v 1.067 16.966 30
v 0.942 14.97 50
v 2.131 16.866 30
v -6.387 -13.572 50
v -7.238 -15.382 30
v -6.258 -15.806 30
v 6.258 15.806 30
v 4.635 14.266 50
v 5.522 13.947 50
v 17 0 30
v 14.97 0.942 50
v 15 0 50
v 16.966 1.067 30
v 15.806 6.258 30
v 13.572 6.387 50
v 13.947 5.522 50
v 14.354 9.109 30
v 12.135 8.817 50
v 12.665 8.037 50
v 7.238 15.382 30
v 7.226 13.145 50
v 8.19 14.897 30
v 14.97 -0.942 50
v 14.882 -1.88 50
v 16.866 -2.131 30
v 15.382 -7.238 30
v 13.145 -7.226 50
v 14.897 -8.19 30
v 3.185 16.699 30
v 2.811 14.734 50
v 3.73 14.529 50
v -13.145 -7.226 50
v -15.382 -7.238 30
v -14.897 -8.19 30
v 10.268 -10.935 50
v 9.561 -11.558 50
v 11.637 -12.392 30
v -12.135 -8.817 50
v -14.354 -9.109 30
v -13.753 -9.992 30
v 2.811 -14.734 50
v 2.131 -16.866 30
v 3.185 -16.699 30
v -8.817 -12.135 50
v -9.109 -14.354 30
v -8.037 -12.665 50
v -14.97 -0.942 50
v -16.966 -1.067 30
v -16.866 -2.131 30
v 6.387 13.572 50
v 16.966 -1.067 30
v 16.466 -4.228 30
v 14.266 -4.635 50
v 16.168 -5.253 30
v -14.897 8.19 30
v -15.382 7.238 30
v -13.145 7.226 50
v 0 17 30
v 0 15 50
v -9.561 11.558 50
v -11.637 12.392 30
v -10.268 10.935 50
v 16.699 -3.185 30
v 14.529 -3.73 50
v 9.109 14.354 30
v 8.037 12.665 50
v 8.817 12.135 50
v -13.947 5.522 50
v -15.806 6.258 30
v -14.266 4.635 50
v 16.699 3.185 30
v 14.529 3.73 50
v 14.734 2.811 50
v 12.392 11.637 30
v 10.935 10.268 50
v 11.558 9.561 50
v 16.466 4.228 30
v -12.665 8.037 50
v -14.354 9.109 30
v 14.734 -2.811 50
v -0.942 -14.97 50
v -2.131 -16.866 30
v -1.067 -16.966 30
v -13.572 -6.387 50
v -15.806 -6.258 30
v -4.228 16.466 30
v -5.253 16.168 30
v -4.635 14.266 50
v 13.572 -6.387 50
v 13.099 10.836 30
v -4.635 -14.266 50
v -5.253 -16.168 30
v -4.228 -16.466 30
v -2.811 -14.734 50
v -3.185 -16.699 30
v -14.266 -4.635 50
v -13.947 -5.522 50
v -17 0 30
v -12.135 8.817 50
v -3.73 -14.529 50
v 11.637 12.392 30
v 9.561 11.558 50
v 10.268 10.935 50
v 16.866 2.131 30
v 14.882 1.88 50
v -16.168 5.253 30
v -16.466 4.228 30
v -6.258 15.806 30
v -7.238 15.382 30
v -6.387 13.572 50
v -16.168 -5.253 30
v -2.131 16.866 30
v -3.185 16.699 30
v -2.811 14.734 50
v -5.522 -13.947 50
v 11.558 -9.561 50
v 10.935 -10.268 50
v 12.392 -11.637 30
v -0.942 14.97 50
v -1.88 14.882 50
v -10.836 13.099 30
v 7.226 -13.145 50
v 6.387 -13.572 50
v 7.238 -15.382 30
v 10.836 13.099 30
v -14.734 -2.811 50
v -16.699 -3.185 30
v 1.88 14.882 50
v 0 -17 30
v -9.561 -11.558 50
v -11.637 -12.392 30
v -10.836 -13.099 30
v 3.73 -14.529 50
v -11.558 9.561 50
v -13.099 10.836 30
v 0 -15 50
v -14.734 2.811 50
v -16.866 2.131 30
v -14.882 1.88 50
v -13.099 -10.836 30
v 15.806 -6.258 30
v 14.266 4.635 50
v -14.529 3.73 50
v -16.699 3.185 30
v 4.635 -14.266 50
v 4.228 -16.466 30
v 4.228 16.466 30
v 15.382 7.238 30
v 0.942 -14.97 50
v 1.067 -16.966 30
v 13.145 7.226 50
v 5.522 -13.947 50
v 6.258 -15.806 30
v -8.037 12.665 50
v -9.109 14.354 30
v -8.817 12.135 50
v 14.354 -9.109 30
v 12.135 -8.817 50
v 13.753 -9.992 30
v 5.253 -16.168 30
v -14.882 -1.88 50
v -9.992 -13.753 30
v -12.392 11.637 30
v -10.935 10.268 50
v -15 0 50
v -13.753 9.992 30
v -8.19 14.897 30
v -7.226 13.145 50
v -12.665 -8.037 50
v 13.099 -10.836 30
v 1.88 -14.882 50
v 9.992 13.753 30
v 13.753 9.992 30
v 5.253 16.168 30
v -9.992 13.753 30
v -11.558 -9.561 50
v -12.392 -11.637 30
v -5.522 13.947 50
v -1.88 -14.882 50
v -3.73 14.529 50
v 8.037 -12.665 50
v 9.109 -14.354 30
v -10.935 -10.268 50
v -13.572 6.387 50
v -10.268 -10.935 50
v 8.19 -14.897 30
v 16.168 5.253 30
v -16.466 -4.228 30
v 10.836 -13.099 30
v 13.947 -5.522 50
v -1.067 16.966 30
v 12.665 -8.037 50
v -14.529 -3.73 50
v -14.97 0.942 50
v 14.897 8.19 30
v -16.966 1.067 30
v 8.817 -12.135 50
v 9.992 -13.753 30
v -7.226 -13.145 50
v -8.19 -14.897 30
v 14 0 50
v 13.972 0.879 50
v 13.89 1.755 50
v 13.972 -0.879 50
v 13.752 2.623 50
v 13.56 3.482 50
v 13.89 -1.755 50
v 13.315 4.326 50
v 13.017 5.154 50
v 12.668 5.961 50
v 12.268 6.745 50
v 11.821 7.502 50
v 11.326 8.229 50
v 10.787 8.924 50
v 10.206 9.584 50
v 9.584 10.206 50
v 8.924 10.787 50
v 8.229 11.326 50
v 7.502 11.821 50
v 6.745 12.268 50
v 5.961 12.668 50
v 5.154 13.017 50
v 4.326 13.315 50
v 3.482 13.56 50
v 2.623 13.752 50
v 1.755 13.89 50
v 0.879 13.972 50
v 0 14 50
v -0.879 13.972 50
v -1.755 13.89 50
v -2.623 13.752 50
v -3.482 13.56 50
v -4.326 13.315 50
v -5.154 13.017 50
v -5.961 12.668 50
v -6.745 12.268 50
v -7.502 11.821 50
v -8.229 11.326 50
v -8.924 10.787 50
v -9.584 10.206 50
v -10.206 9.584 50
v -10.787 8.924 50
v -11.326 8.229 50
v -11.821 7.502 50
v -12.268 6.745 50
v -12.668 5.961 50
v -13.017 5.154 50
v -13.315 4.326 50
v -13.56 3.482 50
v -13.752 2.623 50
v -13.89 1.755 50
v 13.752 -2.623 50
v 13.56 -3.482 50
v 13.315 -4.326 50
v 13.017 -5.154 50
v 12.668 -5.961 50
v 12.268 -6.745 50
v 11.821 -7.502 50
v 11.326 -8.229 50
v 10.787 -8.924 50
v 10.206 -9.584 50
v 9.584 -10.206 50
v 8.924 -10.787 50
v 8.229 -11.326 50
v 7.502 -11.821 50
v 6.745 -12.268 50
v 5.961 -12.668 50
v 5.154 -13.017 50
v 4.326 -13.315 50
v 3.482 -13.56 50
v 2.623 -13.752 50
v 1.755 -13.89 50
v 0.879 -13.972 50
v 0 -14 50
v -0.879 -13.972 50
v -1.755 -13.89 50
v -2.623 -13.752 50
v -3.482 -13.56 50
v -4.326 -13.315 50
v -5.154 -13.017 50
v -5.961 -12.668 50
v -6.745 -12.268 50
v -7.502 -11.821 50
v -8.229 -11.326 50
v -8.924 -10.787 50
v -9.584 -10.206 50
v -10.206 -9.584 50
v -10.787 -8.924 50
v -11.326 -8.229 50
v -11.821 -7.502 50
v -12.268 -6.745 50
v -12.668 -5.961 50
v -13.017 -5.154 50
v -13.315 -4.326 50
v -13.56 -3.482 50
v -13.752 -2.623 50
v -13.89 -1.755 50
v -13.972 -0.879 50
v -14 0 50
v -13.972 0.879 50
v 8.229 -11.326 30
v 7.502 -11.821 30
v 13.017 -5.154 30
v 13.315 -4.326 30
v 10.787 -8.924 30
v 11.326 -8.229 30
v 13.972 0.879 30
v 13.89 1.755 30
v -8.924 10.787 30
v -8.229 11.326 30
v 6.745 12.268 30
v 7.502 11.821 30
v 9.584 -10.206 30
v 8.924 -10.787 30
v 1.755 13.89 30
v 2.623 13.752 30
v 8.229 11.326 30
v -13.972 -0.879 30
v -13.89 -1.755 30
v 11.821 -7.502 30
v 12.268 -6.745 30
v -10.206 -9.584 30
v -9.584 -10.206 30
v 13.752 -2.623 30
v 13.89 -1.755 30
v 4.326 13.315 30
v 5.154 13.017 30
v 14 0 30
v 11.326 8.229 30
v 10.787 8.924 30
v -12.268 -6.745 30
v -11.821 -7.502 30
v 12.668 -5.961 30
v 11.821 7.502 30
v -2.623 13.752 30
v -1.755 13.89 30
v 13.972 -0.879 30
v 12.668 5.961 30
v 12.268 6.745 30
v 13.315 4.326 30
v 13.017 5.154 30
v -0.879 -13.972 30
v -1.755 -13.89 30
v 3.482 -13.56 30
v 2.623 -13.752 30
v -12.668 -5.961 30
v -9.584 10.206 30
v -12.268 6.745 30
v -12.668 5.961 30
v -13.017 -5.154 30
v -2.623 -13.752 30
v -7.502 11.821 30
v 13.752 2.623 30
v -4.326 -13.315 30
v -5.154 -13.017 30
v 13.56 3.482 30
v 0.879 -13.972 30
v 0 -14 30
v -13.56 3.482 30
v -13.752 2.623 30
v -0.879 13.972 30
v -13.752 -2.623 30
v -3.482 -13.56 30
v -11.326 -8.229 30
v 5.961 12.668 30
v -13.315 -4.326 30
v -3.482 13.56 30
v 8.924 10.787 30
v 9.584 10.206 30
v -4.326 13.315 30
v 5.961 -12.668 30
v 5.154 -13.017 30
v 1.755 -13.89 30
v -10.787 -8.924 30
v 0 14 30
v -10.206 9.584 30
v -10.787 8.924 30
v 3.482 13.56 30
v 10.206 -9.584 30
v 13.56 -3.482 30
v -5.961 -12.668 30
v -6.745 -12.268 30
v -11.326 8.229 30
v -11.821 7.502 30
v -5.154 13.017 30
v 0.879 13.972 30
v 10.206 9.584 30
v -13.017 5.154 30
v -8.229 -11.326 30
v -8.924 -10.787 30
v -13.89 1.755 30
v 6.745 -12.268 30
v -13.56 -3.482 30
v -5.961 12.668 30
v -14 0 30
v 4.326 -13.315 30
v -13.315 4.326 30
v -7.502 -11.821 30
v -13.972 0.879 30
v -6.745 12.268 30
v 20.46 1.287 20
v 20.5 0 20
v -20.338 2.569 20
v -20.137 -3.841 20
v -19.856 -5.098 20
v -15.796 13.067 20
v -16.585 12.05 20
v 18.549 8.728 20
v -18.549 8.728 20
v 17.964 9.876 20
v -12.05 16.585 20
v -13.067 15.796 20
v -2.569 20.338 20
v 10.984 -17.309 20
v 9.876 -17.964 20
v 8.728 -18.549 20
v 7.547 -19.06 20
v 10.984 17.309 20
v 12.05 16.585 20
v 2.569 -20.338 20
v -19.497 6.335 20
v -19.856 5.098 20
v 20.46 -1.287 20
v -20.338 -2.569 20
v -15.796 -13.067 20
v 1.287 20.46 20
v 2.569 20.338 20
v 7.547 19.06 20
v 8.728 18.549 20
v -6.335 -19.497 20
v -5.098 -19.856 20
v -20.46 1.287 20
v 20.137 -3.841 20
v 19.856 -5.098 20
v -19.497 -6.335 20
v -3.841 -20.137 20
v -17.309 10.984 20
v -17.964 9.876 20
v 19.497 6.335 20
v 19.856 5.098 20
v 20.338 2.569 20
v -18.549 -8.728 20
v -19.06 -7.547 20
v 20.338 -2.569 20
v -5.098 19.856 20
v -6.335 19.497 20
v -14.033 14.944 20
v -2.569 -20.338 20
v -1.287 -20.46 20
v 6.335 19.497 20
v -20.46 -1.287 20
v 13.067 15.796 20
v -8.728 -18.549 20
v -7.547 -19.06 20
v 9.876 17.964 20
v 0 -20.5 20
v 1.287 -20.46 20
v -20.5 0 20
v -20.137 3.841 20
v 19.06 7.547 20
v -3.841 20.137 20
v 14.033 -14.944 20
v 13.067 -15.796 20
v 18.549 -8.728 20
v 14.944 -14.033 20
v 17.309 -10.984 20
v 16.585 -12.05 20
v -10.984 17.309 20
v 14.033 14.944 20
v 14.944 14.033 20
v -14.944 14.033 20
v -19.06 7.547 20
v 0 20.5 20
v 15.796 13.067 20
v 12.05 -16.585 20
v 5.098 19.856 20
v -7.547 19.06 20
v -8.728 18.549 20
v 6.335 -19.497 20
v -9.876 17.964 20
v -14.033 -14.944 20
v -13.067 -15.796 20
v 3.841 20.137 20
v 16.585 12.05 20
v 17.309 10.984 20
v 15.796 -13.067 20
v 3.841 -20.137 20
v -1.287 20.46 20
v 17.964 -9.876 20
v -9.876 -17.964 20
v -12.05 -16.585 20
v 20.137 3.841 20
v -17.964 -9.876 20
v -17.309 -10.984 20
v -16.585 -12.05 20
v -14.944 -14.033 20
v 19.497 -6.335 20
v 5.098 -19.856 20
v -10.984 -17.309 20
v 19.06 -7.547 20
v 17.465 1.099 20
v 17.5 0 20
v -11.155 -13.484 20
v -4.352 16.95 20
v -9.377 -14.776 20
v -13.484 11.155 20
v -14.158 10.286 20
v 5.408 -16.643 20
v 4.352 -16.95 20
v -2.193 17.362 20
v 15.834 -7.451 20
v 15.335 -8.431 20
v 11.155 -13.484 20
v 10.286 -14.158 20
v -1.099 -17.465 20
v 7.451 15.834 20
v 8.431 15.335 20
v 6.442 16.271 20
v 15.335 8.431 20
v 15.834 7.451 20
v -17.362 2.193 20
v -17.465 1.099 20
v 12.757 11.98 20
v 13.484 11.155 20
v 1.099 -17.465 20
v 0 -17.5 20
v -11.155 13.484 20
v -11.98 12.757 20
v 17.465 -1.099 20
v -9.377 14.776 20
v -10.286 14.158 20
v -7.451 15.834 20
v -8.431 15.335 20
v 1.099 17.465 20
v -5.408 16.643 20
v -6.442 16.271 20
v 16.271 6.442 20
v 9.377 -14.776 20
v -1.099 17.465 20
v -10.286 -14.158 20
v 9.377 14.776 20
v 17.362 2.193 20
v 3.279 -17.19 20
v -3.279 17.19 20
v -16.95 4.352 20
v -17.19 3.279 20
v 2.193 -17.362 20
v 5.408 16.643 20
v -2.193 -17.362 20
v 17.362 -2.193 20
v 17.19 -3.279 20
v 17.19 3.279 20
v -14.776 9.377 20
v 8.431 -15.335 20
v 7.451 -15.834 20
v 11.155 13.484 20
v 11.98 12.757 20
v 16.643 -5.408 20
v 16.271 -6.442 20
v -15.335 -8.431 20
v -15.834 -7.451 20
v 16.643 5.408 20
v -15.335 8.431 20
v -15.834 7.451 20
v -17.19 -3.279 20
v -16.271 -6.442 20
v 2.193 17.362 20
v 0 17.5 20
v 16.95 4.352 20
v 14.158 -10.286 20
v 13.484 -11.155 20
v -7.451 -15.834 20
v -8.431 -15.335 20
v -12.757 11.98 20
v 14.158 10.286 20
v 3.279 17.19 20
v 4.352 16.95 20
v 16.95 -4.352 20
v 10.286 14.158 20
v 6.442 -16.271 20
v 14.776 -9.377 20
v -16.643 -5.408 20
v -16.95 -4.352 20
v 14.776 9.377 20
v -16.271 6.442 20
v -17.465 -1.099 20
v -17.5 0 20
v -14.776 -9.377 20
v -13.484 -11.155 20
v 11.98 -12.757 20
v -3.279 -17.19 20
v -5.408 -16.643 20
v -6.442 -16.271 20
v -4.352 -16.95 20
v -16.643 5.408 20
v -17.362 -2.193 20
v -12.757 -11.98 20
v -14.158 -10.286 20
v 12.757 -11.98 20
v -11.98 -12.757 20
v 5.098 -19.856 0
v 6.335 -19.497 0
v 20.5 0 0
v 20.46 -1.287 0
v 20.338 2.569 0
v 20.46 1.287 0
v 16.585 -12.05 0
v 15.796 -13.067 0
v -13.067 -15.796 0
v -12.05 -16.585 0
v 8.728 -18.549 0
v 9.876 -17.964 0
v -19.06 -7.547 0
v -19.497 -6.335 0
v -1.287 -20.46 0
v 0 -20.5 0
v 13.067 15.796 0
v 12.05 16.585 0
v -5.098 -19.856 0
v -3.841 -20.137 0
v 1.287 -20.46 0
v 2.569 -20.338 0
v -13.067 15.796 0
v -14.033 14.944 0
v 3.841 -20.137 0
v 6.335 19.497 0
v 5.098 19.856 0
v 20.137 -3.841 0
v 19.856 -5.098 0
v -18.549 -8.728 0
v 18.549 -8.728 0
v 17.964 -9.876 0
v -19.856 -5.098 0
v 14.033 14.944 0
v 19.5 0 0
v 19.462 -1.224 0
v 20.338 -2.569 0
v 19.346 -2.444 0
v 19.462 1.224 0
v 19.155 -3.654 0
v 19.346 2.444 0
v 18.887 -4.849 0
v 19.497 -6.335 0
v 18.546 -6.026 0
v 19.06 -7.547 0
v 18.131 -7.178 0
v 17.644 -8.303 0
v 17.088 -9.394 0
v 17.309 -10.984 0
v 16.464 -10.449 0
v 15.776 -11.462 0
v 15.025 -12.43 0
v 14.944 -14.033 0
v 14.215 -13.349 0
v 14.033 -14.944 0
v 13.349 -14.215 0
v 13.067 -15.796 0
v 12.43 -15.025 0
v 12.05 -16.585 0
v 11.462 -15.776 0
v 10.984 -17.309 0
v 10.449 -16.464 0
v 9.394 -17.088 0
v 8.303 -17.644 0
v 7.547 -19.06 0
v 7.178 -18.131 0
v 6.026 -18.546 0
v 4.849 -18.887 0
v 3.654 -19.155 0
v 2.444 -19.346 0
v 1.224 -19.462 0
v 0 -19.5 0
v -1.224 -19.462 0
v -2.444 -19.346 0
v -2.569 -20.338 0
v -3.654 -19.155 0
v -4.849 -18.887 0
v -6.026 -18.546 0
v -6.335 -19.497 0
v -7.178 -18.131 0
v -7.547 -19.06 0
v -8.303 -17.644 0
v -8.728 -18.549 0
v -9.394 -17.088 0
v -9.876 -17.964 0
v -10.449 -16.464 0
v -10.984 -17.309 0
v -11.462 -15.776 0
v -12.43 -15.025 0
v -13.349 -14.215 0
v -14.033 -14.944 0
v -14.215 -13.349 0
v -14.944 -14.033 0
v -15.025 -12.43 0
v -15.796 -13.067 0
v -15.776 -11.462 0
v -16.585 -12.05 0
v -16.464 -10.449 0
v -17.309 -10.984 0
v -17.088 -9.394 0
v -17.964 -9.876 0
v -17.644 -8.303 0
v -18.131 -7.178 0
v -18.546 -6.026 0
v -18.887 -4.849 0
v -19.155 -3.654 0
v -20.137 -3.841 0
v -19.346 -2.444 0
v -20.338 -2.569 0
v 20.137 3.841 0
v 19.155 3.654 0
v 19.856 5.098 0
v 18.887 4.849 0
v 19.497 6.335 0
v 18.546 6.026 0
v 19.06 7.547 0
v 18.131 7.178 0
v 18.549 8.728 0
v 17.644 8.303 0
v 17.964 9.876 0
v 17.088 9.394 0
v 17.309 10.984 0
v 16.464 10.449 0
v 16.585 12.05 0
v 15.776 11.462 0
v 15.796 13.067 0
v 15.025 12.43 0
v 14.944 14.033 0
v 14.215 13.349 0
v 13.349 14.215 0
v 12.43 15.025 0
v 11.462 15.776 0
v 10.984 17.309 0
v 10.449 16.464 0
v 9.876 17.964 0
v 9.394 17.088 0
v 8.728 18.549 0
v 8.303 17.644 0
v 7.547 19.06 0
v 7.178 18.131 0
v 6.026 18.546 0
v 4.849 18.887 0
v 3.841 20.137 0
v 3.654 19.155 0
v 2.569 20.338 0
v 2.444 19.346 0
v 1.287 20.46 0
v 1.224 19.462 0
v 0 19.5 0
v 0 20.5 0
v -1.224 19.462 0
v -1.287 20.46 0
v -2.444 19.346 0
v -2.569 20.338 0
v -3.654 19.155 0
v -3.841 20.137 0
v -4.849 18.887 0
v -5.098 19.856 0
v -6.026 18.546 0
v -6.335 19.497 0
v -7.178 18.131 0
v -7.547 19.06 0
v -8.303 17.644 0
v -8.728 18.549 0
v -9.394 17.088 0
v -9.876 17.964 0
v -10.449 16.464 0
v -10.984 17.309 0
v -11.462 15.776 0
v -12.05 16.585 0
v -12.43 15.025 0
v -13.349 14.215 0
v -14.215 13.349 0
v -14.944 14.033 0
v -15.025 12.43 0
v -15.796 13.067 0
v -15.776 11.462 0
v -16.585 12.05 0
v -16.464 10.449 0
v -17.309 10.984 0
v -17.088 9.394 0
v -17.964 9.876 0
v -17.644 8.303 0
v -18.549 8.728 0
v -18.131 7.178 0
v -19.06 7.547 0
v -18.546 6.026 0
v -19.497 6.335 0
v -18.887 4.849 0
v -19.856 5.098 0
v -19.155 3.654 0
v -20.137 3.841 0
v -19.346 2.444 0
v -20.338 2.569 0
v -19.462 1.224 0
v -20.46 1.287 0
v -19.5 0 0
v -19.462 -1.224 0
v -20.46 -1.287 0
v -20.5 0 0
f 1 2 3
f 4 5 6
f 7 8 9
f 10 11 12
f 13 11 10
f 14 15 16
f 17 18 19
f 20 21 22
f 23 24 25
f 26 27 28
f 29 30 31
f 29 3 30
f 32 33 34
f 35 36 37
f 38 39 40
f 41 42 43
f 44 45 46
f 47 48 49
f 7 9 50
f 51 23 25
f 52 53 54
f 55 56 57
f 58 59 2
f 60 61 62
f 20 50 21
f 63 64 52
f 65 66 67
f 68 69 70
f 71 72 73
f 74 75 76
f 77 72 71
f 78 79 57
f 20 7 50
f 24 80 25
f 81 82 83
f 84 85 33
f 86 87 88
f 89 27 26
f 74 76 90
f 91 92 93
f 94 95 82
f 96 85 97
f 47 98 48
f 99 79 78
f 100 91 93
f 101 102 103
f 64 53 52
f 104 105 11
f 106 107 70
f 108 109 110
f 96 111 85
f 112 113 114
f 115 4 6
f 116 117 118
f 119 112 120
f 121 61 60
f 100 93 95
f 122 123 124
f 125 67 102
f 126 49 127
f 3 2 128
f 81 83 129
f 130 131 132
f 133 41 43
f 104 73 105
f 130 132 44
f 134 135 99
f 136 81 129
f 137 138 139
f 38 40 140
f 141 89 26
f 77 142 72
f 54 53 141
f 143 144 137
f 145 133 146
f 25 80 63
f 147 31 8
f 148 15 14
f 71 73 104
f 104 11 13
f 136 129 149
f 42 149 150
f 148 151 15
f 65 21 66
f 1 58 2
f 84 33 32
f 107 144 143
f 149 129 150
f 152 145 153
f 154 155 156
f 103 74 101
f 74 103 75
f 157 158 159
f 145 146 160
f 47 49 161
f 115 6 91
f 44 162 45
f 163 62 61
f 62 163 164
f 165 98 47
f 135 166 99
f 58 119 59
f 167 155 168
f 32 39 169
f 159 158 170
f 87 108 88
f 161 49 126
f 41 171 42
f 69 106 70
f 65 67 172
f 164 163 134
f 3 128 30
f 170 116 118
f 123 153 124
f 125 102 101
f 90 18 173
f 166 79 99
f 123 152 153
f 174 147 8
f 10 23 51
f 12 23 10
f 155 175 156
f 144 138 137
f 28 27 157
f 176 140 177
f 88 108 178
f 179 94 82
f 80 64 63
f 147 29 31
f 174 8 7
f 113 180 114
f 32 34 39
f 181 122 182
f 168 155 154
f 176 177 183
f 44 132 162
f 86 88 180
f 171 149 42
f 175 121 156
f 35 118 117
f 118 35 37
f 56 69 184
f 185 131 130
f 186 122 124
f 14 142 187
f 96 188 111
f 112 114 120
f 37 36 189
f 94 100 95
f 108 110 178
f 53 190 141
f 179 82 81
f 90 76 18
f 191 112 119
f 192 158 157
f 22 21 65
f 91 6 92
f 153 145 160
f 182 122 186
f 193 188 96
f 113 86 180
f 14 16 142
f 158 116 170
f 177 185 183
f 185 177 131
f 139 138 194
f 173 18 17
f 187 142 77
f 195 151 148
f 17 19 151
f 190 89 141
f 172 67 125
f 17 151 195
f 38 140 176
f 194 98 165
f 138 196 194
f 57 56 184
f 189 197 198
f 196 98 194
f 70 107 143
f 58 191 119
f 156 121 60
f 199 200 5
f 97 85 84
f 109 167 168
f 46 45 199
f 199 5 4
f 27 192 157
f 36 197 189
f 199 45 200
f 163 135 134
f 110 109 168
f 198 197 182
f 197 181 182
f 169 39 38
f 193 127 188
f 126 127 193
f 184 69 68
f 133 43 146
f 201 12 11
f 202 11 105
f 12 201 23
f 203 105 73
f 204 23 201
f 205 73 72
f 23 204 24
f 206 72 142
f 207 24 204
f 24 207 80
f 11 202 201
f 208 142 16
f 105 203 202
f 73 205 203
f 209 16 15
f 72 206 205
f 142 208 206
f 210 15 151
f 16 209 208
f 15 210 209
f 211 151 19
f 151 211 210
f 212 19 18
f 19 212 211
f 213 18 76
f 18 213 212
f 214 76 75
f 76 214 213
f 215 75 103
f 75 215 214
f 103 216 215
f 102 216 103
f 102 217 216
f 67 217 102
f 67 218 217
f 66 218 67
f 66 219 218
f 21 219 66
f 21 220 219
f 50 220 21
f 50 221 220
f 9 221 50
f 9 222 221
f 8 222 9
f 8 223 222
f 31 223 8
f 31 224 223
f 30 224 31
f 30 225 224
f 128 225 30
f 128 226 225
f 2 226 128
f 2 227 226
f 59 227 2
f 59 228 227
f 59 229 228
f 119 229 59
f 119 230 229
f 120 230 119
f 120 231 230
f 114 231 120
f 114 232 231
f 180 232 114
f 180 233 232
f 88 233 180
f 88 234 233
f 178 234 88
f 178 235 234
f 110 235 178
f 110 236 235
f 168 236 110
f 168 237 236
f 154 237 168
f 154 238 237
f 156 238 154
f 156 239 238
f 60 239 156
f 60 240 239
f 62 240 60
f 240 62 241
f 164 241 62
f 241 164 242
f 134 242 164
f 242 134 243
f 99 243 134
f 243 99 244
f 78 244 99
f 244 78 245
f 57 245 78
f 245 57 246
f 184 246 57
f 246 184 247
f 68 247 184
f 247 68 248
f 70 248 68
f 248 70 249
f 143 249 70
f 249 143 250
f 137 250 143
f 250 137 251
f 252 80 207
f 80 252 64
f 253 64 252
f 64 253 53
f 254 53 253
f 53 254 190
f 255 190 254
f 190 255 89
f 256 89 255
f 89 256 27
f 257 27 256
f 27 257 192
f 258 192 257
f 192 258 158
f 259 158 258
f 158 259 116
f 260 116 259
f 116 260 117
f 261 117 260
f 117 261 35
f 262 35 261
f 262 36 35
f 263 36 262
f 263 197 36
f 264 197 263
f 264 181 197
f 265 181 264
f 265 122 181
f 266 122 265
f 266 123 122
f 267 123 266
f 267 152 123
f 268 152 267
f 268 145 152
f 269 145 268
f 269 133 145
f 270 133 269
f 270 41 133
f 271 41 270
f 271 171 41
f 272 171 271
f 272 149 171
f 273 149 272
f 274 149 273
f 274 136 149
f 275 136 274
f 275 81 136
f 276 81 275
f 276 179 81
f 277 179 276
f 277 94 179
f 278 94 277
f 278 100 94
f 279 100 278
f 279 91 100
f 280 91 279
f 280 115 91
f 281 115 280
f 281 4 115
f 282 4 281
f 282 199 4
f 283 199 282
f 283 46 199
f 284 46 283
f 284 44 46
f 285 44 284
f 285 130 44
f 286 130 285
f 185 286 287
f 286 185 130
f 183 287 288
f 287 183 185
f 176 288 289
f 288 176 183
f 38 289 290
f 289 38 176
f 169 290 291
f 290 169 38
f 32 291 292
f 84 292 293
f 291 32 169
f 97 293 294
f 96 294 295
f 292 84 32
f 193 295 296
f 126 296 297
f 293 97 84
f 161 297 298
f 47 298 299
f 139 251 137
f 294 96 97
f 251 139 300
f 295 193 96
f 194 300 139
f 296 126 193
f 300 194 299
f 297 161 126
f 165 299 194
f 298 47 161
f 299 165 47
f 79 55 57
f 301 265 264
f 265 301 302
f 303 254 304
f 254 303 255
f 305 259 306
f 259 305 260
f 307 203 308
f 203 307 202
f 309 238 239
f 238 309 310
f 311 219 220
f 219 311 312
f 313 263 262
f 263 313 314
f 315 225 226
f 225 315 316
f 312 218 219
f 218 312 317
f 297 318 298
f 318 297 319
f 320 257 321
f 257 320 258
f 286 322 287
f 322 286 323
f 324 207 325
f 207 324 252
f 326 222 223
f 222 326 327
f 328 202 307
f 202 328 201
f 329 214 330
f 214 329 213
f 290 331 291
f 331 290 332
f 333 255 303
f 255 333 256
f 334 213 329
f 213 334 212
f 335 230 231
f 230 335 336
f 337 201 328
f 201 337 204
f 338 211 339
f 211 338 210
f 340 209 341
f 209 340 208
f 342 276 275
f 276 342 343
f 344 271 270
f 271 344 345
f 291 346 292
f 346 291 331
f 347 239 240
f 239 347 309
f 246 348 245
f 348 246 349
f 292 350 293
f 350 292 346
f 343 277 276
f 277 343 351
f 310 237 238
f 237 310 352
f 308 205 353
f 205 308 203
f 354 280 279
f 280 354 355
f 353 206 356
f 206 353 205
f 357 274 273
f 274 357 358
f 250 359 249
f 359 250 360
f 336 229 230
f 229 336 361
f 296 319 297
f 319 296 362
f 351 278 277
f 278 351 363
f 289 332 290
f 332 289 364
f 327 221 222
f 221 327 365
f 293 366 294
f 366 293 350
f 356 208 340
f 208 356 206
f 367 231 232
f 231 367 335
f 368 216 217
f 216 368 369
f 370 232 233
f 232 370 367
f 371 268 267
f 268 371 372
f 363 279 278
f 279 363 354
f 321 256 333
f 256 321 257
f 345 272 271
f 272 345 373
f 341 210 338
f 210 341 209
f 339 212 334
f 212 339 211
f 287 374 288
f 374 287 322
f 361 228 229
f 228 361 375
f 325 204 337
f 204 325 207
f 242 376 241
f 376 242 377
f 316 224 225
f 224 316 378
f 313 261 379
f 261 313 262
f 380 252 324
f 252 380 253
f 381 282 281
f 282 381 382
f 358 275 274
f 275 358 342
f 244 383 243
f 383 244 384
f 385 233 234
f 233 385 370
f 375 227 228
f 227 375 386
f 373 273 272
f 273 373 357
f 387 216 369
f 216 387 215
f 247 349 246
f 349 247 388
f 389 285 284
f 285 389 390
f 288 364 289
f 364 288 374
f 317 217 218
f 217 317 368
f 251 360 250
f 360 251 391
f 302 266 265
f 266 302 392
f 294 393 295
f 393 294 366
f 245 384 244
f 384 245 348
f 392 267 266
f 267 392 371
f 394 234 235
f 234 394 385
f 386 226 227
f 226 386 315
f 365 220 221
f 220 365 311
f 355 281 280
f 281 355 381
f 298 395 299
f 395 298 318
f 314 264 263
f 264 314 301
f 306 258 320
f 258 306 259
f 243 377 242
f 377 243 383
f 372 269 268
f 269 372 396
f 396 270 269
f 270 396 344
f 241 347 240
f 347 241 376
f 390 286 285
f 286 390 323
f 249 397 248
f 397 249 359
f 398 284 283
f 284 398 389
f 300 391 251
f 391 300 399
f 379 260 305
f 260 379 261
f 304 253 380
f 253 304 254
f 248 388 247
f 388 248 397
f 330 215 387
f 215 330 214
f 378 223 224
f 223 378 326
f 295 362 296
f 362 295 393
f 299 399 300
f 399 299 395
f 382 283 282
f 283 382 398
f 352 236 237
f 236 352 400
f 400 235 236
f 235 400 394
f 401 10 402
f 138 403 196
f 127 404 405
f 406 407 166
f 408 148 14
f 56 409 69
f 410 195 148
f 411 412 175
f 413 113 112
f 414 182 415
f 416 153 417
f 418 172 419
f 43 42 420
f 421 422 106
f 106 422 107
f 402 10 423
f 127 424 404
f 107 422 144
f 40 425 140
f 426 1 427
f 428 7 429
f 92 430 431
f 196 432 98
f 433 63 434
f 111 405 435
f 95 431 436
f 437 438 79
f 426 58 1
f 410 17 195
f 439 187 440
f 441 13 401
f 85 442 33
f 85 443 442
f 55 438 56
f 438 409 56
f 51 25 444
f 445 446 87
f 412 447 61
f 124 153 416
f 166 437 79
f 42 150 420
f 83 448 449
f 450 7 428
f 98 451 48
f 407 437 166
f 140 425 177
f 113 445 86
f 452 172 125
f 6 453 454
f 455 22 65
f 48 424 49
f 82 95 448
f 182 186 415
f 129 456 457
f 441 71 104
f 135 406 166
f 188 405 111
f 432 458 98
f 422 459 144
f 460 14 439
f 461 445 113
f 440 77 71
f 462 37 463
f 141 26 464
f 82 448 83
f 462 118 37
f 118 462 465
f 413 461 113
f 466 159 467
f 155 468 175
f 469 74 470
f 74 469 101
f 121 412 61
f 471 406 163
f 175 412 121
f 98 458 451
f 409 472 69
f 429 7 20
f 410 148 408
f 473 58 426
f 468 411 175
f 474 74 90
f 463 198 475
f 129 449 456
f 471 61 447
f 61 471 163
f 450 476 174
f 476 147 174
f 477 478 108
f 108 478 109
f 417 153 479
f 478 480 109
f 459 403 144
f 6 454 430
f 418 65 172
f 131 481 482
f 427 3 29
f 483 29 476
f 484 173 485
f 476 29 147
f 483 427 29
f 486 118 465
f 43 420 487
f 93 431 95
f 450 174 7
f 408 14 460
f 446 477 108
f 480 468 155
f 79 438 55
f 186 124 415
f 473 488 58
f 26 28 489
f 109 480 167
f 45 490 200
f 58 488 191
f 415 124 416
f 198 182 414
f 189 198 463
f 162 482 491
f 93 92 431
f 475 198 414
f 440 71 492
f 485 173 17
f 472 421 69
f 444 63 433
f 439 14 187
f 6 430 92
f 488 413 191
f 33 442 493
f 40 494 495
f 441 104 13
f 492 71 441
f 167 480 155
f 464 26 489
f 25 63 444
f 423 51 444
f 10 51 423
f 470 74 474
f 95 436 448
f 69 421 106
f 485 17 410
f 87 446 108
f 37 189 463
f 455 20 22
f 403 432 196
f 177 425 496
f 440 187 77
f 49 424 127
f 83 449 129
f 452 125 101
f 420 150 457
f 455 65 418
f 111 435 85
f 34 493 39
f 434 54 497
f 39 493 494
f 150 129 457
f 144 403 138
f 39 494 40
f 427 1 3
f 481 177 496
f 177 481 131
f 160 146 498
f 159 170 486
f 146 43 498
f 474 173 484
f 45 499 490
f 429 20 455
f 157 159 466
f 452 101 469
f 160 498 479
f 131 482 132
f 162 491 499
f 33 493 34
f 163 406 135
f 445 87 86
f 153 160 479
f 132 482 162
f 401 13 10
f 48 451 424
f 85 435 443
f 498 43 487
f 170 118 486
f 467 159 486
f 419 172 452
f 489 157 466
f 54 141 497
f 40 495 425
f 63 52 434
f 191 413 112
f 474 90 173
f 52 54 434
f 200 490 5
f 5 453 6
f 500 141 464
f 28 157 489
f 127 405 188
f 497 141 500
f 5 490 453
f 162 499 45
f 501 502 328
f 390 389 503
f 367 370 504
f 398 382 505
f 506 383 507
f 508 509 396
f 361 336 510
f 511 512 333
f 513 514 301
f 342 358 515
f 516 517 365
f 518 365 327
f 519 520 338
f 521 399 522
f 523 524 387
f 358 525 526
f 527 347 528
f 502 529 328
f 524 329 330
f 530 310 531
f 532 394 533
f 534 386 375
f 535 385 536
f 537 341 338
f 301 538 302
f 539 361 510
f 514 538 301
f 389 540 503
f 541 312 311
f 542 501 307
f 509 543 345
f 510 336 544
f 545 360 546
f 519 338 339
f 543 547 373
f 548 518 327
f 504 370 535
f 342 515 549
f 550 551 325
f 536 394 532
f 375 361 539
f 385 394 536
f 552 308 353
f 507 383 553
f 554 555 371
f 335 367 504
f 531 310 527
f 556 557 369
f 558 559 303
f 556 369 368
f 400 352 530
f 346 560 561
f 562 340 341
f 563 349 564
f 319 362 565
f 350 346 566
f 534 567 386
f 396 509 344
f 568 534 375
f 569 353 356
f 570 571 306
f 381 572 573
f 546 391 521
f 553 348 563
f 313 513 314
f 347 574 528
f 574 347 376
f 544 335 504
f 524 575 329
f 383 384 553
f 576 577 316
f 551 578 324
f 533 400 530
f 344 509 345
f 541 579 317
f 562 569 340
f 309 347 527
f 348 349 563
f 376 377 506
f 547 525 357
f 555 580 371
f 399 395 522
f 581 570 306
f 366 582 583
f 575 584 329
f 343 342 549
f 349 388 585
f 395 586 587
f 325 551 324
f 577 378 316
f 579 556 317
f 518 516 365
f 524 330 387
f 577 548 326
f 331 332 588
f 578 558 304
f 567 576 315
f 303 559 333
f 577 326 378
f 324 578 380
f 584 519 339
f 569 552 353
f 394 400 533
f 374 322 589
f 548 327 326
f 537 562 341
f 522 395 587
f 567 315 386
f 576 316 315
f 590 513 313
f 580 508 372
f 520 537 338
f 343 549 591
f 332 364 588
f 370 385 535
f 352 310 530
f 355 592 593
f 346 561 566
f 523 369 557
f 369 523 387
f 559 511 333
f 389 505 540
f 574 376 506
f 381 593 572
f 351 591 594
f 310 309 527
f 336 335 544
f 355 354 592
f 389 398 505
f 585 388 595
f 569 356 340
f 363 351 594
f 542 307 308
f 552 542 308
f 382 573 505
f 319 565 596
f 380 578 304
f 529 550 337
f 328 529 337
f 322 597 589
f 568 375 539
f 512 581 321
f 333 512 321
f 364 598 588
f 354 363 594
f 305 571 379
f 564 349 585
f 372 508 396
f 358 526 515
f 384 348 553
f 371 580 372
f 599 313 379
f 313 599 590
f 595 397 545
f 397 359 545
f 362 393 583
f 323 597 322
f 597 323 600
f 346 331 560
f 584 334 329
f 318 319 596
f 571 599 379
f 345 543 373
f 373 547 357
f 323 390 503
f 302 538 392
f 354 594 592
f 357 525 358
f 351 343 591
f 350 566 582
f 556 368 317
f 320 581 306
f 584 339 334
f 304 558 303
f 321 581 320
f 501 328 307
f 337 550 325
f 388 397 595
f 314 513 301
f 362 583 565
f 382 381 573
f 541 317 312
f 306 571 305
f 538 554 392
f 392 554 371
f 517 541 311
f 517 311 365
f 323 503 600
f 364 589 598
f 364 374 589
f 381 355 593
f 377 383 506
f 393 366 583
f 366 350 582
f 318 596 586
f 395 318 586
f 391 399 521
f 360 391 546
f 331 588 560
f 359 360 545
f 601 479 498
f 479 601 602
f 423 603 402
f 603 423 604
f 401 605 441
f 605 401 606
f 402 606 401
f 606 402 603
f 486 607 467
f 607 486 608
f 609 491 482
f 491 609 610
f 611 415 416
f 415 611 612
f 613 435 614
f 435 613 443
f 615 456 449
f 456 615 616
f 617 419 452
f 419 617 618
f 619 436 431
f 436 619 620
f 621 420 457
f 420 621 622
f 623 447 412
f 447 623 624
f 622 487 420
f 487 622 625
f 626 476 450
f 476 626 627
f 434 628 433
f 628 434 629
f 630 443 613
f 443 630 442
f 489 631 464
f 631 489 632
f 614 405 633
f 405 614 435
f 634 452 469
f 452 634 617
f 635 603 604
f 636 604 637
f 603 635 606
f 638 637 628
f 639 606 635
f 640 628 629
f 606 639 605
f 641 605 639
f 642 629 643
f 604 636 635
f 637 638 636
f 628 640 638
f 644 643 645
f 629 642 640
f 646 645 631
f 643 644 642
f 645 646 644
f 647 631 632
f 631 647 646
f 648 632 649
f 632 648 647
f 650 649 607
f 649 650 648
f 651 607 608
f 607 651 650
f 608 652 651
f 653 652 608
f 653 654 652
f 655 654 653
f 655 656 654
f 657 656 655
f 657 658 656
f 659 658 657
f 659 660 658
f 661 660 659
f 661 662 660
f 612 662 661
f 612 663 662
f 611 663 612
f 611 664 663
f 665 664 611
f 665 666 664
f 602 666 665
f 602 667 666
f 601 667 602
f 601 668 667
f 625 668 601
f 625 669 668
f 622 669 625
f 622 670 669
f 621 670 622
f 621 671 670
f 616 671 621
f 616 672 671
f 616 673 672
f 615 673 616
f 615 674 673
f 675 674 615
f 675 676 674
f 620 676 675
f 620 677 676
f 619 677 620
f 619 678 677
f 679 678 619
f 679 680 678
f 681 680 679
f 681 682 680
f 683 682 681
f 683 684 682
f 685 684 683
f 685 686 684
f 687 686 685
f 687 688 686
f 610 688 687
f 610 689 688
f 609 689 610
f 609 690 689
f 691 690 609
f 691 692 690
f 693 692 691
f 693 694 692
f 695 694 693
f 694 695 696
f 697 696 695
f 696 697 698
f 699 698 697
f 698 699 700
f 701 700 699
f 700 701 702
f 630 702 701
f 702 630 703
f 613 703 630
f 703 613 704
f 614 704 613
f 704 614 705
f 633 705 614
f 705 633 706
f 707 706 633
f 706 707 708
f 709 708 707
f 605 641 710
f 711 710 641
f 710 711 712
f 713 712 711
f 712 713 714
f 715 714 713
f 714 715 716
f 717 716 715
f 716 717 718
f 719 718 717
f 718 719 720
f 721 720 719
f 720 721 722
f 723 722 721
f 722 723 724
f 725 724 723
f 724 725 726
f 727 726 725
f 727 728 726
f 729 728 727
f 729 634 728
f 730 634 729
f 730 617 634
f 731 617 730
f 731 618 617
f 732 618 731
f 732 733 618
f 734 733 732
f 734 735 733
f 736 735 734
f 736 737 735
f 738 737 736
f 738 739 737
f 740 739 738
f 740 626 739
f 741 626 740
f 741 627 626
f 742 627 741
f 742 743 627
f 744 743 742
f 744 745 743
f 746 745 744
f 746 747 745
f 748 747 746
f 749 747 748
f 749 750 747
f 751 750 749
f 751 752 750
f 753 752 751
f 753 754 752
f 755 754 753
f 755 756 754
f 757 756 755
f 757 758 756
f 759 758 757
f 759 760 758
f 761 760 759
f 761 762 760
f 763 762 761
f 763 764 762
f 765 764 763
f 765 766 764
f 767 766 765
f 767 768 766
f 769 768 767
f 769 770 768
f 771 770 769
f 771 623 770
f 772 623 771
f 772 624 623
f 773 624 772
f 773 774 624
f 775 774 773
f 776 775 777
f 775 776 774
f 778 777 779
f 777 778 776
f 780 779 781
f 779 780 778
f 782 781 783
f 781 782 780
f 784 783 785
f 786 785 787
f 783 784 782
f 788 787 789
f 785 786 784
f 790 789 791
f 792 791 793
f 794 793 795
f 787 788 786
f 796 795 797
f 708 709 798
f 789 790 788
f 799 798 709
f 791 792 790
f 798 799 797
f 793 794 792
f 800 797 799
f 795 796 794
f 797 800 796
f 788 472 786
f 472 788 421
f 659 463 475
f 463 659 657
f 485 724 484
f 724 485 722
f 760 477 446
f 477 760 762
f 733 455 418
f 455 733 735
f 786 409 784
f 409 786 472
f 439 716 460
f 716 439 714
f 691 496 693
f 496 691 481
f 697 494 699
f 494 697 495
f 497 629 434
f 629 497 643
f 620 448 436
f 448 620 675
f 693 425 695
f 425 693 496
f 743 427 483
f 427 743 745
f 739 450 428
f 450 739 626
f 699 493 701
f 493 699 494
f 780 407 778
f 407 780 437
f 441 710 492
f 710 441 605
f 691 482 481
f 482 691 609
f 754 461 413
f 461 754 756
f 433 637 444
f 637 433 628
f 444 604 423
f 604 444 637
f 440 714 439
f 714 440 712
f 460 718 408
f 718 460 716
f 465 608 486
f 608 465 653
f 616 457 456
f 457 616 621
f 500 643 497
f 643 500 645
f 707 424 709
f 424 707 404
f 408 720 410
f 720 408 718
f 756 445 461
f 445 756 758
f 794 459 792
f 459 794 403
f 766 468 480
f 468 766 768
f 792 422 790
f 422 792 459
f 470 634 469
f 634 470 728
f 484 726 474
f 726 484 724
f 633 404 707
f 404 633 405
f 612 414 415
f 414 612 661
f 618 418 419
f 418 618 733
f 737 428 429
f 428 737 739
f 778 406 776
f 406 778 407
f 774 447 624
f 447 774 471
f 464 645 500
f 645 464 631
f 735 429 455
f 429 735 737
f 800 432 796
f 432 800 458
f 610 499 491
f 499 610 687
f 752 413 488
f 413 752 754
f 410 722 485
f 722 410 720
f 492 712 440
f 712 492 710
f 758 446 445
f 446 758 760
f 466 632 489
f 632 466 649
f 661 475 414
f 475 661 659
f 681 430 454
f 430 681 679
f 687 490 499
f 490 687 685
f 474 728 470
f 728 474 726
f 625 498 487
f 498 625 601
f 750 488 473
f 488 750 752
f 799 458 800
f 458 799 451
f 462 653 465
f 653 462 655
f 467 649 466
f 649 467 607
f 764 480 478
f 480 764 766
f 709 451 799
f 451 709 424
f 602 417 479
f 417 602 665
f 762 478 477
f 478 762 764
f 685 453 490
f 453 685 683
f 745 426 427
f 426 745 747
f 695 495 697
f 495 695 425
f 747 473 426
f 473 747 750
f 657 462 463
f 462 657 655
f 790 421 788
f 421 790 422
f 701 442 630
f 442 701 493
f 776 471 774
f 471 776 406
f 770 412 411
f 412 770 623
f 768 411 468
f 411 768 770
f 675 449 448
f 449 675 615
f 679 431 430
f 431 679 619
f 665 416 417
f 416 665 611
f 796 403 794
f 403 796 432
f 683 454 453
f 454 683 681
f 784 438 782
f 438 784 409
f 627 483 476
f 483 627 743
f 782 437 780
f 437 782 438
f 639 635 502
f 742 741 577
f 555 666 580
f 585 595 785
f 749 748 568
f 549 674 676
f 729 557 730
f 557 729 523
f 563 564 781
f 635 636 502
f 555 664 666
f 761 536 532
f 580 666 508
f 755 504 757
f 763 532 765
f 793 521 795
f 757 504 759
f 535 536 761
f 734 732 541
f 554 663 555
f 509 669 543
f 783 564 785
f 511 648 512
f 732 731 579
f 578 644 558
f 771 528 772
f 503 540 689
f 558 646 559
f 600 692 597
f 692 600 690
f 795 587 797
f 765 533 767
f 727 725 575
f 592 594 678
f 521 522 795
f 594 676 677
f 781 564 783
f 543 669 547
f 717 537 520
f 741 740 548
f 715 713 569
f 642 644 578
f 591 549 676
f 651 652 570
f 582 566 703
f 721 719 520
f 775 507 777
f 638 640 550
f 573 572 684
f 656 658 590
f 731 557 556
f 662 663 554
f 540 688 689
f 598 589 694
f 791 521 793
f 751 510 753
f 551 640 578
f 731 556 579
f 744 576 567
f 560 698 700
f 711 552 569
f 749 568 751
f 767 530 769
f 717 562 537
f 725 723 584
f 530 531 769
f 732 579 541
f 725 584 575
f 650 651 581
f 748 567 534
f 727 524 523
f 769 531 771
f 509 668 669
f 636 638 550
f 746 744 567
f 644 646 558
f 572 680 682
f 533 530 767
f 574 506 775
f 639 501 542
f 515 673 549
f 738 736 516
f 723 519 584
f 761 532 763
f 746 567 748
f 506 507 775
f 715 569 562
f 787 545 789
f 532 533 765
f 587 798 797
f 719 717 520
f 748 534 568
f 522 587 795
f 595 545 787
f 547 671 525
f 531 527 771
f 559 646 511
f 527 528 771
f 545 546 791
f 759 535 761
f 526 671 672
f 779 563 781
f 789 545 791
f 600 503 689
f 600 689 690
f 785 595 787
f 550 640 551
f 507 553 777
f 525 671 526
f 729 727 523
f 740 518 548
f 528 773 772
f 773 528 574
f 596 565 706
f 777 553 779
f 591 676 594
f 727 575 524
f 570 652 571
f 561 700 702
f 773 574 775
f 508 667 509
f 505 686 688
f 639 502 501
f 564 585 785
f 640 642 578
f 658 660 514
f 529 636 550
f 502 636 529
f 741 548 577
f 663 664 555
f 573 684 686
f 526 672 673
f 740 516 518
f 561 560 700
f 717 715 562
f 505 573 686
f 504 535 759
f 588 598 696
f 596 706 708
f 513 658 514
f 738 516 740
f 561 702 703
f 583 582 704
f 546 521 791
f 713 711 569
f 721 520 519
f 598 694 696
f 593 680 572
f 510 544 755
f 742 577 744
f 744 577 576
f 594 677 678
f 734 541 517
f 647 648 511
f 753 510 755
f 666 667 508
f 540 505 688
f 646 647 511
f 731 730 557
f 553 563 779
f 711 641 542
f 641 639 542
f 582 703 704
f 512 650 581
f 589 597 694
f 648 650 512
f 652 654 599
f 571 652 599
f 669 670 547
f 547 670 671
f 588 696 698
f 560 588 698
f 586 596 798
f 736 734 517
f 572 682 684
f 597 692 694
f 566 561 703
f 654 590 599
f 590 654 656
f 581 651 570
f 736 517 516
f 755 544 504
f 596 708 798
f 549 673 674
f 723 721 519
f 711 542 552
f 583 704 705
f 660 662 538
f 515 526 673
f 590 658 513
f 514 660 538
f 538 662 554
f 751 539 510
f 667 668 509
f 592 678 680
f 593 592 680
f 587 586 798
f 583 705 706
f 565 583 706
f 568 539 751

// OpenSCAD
/* [Basics] */

// Inner Diameter of Part A (mm)
part_a_inner_diameter = 32;

// Outer Diameter of Part B (mm)
part_b_outer_diameter = 37;

/* [Advanced] */

// Material Strength (mm)
material_strength = 4;

// How long is the slide on section per part? (mm)
slide_on_length = 20;

// How long is the connection section between the parts? (mm)
connection_length = 10;

// What is the slide on ramp for creating a tight fit? (mm)
slide_on_ramp = 2;

/* [Hidden] */
//  Number of fragments for rendering a circle
$fn = 100;

//projection(cut = true) rotate([90,0,0])
//projection(cut = false) rotate([90,0,0])
adapter(
    part_a_inner_diameter, 
    part_b_outer_diameter, 
    material_strength, 
    slide_on_length, 
    connection_length,
    slide_on_ramp
);


module adapter(partA, partB, strength, length, con_length, ramp) {
    union() {
        // Part A
        translate([0, 0, length + con_length]) {
            difference() {
                cylinder(length, d1 = partA + ramp, d2 = partA - ramp);
                cylinder(length, d1 = partA - strength, d2 = partA - strength);
            }
        }

        // Connection between Part A and Part B
        translate([0, 0, length]) {
            difference() {
                cylinder(con_length, d1 = partB + strength, d2 = partA + ramp);
                cylinder(con_length, d1 = partB - ramp, d2 = partA - strength);
            }
        }

        // Part B
        difference() {
            cylinder(length, d1 = partB + strength, d2 = partB + strength);
            cylinder(length, d1 = partB + ramp, d2 = partB - ramp);
        }
    }
}
